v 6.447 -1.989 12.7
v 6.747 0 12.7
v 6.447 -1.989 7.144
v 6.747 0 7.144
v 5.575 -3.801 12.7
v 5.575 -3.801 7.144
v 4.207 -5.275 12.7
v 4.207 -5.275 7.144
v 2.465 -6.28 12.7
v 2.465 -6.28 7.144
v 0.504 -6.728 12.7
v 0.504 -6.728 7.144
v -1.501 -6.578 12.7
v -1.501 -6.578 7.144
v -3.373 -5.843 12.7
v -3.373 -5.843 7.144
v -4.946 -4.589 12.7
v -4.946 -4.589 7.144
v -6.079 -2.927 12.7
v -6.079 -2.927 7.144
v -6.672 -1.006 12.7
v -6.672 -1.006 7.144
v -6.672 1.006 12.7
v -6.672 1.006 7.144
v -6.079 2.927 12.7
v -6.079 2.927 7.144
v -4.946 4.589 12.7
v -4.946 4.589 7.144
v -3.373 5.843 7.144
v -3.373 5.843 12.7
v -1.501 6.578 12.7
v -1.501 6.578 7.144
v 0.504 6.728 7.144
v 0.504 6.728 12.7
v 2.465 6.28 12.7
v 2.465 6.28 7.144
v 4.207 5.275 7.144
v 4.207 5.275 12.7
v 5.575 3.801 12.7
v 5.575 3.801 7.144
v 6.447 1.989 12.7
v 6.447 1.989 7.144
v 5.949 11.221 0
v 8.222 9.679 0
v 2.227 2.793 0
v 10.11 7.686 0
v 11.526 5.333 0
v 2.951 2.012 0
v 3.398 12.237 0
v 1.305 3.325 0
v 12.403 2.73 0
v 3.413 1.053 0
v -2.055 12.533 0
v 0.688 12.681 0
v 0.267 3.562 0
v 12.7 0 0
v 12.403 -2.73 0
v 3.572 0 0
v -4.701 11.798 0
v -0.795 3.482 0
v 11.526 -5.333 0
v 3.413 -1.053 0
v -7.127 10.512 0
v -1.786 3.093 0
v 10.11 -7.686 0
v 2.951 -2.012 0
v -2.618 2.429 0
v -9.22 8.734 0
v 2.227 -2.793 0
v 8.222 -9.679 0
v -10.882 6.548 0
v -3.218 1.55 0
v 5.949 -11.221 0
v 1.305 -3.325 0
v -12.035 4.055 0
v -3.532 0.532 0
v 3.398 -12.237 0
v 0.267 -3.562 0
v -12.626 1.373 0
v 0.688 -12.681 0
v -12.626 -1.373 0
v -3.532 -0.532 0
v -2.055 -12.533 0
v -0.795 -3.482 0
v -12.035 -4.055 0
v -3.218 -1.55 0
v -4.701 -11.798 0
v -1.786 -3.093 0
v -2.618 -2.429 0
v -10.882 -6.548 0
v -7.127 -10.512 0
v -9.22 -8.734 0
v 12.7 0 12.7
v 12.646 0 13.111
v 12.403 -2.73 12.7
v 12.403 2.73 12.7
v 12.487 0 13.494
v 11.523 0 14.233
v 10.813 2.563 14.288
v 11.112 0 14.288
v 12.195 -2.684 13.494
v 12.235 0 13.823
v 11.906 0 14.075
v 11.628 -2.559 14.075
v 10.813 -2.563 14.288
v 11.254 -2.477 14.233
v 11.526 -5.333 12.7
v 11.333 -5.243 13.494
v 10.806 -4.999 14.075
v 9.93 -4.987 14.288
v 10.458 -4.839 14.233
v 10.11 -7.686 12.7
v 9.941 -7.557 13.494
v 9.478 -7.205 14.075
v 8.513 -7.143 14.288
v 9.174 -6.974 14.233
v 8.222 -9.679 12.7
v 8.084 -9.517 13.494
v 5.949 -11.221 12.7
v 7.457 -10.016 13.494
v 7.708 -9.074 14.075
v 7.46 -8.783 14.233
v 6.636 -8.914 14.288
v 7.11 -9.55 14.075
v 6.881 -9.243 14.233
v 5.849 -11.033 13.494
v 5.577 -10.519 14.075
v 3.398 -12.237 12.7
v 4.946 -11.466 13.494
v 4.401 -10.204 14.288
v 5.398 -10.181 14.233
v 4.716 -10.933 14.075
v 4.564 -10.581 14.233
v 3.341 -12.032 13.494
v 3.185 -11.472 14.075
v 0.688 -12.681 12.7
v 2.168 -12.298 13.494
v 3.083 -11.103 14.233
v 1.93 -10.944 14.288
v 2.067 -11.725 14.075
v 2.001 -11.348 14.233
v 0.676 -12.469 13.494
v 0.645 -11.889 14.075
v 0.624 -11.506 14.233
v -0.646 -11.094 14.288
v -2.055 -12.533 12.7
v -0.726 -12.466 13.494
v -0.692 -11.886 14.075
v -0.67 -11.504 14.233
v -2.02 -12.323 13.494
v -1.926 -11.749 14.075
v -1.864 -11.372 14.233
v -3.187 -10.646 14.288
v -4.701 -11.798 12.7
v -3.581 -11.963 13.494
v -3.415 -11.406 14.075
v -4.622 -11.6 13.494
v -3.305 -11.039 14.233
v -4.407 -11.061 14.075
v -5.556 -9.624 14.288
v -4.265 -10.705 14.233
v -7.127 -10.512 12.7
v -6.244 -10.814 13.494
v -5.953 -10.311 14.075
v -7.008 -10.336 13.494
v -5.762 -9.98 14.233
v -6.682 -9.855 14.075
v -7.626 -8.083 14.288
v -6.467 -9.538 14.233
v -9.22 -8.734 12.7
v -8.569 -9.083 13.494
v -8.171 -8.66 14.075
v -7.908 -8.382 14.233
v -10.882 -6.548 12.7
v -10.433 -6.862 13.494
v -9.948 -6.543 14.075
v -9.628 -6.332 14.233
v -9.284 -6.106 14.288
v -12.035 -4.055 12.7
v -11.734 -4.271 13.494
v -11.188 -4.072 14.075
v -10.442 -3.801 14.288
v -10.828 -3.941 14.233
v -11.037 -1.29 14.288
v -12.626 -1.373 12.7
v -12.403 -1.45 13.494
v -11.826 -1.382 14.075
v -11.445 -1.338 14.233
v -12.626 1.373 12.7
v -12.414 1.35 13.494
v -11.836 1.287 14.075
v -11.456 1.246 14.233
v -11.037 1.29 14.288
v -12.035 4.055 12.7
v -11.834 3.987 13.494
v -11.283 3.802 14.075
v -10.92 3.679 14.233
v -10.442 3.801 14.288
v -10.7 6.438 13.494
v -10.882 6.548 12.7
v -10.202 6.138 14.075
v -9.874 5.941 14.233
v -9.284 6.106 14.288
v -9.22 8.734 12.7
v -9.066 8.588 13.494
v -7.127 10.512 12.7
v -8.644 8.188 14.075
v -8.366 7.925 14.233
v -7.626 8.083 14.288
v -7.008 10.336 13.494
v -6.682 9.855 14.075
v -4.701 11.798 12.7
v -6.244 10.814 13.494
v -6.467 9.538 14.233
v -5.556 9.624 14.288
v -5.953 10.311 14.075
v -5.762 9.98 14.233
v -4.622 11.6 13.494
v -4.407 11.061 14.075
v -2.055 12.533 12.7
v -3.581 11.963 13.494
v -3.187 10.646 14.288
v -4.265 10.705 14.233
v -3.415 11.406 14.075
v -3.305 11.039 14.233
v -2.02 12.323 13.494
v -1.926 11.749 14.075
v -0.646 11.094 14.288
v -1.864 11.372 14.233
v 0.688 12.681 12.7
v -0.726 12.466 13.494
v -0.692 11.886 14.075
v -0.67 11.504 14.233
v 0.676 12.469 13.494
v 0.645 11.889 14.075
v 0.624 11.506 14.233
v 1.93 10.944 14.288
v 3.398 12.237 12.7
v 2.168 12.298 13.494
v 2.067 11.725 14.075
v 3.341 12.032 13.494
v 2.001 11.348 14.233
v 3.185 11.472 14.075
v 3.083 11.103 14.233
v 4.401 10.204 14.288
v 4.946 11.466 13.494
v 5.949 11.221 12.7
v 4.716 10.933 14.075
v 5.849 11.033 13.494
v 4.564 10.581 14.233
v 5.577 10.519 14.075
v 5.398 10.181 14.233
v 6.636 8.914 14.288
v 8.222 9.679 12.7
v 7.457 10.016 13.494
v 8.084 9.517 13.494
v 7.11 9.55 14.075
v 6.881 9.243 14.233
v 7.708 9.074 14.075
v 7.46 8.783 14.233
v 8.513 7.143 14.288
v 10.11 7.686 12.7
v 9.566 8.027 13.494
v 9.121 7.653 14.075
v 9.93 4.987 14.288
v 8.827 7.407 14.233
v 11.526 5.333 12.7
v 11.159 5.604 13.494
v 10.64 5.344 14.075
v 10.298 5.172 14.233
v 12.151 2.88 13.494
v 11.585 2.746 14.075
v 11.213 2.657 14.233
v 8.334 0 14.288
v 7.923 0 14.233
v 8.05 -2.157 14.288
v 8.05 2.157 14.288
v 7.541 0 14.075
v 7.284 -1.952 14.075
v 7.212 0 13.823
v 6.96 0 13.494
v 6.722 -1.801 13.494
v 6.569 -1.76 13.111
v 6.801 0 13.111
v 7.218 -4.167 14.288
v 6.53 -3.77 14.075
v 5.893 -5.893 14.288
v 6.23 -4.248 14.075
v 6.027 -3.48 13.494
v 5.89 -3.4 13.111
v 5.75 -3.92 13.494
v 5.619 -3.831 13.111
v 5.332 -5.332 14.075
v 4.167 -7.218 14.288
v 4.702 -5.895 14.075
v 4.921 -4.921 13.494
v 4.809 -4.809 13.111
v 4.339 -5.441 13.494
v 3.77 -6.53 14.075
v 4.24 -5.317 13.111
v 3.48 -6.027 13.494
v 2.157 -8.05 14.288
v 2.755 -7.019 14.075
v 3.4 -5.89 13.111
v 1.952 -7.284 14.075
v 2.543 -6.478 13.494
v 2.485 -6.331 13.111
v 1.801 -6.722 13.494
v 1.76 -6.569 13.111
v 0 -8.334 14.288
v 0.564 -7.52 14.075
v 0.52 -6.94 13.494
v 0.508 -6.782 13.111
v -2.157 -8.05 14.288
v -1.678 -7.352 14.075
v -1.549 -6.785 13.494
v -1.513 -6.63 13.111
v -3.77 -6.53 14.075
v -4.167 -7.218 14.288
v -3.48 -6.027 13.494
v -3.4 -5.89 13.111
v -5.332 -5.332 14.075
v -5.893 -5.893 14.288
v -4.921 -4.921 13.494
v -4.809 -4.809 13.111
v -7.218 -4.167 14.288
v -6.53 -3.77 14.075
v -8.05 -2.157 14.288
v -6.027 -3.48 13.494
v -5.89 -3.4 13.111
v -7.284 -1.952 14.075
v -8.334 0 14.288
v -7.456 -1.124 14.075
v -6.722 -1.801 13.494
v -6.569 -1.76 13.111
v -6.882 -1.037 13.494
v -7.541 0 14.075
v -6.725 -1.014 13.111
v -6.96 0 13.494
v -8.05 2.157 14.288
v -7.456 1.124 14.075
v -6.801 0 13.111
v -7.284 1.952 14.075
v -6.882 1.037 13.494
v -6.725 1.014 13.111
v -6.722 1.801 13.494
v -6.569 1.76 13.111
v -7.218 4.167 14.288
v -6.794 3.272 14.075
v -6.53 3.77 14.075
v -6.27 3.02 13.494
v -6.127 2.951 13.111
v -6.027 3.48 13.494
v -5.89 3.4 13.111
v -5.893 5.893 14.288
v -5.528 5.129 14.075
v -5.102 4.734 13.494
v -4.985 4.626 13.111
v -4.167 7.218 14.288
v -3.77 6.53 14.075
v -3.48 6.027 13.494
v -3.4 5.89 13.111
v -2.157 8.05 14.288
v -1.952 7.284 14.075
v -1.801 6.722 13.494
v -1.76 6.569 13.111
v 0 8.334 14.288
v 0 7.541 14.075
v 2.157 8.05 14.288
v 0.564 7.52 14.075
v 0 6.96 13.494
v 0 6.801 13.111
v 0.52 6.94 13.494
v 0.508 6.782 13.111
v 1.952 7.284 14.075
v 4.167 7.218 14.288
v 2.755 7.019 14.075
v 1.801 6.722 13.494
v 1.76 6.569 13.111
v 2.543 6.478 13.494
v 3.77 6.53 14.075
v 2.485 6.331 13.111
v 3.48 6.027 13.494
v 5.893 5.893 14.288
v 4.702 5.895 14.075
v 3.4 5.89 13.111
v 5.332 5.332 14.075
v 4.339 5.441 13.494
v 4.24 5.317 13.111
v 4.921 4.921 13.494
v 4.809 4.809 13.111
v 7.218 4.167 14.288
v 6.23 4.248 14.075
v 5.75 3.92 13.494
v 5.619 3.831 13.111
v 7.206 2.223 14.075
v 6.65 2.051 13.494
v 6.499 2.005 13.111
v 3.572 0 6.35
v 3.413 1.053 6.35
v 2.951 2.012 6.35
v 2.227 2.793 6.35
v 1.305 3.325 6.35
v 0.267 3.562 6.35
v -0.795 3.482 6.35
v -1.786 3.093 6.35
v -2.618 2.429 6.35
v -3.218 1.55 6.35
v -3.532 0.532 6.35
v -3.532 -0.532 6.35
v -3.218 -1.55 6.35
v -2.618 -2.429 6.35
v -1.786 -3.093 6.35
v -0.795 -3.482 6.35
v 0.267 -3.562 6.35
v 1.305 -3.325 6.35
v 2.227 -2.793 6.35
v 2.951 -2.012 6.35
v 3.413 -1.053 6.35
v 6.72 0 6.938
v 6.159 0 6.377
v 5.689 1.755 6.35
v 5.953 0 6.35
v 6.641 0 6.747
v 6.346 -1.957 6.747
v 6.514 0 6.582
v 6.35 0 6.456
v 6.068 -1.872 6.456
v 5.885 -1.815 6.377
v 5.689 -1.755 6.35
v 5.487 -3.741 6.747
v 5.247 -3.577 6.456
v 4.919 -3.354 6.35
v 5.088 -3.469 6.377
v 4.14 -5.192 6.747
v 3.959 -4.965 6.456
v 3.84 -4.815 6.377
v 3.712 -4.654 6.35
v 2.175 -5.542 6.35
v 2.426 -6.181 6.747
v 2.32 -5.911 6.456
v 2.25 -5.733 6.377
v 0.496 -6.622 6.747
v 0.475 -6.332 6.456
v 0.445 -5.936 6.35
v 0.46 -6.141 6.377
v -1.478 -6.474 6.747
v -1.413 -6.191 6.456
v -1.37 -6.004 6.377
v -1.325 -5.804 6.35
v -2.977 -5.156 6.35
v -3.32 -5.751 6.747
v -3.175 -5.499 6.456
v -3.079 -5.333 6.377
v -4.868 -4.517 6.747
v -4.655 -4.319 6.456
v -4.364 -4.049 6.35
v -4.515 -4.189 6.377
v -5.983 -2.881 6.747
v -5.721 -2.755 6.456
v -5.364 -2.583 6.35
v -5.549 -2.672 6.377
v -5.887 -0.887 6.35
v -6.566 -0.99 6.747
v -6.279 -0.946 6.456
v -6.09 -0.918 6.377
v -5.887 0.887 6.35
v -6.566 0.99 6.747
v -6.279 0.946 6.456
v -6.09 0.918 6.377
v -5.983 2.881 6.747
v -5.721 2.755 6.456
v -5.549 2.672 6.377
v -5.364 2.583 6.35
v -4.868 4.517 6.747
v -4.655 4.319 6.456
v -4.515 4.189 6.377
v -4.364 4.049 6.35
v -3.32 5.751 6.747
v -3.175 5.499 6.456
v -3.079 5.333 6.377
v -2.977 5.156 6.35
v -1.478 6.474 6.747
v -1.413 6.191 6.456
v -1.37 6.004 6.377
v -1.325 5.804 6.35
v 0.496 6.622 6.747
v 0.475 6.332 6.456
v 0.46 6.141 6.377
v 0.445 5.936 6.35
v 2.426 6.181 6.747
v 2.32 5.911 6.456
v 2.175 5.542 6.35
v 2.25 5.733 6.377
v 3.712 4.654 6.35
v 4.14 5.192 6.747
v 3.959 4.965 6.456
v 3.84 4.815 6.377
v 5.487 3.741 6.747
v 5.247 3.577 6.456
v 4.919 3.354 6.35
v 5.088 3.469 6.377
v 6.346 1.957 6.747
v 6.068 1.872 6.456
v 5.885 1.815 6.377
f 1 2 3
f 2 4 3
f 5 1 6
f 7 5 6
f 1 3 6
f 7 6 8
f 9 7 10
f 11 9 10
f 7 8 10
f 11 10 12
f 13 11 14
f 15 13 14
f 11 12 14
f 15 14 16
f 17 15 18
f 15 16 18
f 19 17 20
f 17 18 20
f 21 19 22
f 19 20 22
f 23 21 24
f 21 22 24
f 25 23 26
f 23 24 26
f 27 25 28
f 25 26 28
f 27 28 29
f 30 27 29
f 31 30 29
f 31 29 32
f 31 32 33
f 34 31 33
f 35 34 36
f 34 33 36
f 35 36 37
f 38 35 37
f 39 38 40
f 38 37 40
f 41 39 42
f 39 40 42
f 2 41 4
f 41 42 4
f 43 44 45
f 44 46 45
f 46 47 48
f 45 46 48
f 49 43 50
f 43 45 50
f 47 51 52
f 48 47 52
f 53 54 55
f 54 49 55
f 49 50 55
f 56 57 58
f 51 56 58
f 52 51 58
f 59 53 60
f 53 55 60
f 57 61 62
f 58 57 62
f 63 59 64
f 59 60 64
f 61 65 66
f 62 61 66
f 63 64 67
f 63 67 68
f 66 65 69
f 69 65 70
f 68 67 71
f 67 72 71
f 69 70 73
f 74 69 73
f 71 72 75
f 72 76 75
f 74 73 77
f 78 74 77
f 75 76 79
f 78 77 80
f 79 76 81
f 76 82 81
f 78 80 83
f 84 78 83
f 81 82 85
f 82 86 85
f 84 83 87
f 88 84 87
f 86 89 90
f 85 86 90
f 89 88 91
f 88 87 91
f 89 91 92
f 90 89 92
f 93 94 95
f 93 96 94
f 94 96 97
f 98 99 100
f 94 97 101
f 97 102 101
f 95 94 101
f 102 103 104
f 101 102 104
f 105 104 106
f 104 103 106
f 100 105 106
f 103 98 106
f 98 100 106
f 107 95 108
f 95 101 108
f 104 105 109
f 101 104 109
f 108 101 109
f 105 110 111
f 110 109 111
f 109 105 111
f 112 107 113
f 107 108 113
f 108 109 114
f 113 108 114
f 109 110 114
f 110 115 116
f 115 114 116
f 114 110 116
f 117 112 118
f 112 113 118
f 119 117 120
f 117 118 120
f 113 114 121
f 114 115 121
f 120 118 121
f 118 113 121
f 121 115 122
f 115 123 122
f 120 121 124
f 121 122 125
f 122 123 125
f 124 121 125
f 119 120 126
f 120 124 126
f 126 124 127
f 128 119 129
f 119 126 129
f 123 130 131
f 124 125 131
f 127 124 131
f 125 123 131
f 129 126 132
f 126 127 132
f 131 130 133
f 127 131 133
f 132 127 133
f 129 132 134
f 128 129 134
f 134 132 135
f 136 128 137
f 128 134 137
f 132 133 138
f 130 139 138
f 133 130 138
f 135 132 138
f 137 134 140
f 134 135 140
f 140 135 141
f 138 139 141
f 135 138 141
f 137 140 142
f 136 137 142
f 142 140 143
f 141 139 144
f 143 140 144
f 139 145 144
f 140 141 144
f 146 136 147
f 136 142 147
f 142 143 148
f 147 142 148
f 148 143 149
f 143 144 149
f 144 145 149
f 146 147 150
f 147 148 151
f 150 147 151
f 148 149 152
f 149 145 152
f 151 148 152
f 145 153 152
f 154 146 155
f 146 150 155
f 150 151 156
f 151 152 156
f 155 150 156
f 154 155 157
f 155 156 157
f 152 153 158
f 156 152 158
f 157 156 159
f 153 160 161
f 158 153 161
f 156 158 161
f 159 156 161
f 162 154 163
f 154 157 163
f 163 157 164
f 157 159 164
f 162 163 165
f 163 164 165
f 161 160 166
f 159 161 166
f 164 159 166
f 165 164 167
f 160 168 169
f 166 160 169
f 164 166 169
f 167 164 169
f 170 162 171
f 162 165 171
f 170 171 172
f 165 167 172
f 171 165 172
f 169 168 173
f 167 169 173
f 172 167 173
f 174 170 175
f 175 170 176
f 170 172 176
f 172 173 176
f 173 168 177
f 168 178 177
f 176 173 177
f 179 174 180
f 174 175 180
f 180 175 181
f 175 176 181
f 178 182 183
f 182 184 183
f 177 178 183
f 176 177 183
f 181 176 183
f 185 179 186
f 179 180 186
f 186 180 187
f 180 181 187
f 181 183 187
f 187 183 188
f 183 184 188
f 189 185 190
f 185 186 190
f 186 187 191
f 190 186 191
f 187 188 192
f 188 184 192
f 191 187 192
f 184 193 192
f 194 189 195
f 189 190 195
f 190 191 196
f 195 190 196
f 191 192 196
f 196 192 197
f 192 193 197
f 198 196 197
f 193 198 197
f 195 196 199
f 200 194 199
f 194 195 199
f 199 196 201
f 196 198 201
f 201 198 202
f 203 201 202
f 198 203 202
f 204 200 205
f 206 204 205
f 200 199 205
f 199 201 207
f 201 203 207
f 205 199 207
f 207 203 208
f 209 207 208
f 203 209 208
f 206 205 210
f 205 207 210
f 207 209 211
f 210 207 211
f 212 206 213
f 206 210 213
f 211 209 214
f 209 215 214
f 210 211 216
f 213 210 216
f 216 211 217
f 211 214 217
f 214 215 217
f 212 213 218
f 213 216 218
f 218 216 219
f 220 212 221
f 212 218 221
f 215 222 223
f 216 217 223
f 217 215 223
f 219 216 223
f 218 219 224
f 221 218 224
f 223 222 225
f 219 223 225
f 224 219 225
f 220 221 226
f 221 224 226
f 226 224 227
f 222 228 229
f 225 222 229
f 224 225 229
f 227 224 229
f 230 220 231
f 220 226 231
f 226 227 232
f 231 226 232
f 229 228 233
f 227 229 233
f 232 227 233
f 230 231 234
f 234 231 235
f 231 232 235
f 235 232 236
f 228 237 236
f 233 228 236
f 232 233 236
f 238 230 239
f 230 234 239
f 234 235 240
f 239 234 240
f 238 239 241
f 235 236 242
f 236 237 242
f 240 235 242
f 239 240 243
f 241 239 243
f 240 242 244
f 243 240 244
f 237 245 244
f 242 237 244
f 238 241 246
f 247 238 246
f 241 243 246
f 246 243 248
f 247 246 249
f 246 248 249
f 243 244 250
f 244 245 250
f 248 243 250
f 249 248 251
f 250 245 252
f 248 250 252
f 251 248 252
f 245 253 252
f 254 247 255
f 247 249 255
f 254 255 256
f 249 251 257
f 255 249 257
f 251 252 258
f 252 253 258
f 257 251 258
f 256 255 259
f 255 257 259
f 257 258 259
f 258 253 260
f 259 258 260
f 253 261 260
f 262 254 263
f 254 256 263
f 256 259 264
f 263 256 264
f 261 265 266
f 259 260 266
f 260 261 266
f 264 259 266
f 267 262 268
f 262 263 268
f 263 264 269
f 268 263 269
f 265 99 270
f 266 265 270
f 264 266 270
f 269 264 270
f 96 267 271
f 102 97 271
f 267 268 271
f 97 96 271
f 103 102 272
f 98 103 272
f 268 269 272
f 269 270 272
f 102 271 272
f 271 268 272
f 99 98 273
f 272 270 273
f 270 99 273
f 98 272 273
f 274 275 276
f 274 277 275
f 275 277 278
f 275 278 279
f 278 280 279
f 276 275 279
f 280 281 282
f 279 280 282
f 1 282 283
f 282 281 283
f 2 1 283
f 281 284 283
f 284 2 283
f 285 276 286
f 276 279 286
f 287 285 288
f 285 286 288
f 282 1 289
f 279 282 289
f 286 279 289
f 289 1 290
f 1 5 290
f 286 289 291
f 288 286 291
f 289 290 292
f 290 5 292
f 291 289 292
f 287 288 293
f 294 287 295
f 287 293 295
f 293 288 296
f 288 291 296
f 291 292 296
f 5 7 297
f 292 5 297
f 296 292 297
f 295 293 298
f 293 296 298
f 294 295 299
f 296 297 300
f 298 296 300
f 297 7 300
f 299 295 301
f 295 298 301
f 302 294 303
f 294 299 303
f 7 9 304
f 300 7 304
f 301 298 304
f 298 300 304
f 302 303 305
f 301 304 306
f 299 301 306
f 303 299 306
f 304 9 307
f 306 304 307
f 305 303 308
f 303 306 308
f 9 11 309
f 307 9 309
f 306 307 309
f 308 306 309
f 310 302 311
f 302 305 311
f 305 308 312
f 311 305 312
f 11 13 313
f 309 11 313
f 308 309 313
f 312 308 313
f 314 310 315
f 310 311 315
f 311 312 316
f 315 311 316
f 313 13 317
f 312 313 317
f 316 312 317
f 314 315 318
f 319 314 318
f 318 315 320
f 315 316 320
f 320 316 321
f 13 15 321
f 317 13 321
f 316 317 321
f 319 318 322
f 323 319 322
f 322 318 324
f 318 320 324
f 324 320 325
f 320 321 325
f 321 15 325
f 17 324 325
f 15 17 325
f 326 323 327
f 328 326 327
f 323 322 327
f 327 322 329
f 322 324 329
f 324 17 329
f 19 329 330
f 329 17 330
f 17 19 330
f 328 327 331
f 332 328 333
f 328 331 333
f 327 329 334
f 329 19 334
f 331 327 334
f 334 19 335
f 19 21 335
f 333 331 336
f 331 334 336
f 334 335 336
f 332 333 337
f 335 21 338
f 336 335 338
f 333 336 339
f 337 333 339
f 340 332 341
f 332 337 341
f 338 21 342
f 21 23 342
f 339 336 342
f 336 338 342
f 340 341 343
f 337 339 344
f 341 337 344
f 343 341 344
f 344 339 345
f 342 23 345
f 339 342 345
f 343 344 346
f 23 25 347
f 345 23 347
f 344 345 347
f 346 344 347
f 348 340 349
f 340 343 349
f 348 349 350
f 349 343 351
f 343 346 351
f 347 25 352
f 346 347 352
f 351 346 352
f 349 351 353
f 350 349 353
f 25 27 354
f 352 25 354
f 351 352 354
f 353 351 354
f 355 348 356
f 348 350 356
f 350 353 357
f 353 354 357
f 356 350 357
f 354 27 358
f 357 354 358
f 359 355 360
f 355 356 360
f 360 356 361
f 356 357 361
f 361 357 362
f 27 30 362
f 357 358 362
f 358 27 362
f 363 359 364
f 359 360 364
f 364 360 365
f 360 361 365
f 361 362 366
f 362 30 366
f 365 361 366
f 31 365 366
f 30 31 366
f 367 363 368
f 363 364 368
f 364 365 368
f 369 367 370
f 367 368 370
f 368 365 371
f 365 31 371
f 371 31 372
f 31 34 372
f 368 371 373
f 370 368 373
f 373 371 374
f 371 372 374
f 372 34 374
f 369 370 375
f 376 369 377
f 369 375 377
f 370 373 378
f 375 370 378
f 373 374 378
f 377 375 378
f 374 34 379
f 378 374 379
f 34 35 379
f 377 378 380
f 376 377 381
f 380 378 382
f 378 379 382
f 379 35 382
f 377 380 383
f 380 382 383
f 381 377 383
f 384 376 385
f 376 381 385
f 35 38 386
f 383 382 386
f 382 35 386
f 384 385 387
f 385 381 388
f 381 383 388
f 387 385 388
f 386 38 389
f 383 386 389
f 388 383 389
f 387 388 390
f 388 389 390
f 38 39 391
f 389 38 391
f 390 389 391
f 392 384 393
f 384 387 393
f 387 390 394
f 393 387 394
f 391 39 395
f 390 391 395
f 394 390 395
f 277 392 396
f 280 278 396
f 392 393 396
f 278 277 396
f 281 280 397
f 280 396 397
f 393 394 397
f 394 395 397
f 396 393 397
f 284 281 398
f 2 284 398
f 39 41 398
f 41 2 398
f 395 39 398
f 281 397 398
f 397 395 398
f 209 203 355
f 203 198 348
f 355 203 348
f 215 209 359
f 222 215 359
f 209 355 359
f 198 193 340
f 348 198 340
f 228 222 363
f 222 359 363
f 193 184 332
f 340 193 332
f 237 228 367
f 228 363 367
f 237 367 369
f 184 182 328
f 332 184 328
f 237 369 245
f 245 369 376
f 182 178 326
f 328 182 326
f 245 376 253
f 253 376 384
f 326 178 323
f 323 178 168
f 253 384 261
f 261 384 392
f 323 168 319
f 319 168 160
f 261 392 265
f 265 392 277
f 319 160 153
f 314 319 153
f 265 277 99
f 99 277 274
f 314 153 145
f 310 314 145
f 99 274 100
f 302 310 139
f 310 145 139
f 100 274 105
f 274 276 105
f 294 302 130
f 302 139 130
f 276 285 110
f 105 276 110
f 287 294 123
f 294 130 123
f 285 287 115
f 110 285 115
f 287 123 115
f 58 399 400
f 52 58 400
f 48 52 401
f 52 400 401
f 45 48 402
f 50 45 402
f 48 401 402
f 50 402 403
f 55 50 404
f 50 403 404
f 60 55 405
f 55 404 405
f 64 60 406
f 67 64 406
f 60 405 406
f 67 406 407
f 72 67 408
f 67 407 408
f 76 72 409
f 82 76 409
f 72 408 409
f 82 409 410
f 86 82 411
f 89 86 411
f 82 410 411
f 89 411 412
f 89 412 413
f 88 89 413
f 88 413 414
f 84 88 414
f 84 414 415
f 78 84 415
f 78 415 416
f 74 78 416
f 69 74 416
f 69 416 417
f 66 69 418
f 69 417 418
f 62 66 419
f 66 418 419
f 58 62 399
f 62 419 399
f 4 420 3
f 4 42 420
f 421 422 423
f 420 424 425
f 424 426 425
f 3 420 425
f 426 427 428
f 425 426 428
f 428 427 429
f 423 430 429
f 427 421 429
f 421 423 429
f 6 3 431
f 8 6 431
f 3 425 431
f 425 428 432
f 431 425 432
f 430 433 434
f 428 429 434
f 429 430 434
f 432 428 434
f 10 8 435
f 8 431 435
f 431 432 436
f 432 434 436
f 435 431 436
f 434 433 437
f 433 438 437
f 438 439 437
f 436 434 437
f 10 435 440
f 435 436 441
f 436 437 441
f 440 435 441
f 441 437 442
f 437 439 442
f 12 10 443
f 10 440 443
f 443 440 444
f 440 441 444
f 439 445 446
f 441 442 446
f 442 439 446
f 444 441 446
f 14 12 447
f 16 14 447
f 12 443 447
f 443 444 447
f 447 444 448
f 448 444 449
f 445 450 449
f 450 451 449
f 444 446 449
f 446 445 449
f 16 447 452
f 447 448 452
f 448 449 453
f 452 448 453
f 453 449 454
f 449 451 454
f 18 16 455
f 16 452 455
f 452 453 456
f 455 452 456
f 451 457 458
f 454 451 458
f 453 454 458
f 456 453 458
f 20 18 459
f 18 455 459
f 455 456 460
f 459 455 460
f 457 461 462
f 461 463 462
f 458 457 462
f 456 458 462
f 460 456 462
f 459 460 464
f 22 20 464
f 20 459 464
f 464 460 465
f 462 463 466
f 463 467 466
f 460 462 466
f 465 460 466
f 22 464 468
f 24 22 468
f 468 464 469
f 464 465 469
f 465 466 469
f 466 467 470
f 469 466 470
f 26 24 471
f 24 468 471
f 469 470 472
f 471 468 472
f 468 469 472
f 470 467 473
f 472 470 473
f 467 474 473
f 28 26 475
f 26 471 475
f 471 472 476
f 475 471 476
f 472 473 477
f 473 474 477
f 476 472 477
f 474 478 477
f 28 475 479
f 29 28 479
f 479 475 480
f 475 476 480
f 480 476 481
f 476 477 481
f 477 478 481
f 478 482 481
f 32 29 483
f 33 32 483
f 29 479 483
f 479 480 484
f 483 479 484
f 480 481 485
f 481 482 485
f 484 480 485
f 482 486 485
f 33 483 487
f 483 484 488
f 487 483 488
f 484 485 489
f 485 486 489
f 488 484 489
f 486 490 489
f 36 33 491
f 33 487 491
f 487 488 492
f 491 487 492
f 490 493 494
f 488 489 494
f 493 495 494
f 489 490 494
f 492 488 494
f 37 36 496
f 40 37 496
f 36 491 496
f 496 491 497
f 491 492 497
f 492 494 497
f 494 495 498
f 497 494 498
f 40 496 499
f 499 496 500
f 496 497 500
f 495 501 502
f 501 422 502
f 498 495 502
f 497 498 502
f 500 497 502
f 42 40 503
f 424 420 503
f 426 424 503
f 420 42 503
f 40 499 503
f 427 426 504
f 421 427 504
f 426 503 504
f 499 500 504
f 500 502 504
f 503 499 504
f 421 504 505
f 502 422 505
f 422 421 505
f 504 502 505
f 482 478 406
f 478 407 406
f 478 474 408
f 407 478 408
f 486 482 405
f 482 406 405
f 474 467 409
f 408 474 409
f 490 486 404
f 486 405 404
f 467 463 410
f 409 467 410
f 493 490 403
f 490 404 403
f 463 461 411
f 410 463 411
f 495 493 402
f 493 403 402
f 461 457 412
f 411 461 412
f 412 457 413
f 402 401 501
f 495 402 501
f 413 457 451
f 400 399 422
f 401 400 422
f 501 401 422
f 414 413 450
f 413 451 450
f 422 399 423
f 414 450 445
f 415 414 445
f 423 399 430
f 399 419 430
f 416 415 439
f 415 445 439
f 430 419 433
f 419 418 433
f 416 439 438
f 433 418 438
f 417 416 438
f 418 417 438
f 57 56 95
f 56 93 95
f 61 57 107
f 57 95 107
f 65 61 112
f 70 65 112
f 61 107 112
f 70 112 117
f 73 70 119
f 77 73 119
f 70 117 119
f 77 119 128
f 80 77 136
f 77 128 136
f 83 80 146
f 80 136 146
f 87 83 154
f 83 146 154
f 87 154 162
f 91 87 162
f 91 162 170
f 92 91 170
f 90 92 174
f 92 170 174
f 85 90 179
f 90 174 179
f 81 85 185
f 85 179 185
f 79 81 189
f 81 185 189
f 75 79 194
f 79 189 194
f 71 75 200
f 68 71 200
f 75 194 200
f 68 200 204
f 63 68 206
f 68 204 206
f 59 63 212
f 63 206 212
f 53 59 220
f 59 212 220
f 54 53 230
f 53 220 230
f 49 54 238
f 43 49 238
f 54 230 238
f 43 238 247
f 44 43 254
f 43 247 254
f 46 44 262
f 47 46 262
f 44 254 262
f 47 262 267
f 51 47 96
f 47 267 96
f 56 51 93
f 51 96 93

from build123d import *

# Parameters (mm, degrees)
F2_R     = 3.571875
F3_DEPTH = 6.35


with BuildPart() as f1:
    # F0 (on Front) → F1 (revolve)
    with BuildSketch(Plane.XZ):
        with BuildLine():
            Line((5.953125, 6.35), (0, 6.35))
            Line((0, 6.35), (0, 0))
            Line((0, 0), (12.7, 0))
            Line((12.7, 0), (12.7, 12.7))
            ThreePointArc((12.7, 12.7), (12.235032, 13.822532), (11.1125, 14.2875))
            Line((11.1125, 14.2875), (8.334375, 14.2875))
            ThreePointArc((8.334375, 14.2875), (7.211843, 13.822532), (6.746875, 12.7))
            Line((6.746875, 12.7), (6.746875, 7.14375))
            ThreePointArc((6.746875, 7.14375), (6.514391, 6.582484), (5.953125, 6.35))
        make_face()
    revolve(axis=Axis((0, 0, 3.175), (0, 0, -1)))

    # F2 (on face) → F3 (cut, through all)
    with BuildSketch(Plane.XY.offset(6.35)):
        Circle(F2_R)
    extrude(amount=-F3_DEPTH, mode=Mode.SUBTRACT)


solid = f1.part
